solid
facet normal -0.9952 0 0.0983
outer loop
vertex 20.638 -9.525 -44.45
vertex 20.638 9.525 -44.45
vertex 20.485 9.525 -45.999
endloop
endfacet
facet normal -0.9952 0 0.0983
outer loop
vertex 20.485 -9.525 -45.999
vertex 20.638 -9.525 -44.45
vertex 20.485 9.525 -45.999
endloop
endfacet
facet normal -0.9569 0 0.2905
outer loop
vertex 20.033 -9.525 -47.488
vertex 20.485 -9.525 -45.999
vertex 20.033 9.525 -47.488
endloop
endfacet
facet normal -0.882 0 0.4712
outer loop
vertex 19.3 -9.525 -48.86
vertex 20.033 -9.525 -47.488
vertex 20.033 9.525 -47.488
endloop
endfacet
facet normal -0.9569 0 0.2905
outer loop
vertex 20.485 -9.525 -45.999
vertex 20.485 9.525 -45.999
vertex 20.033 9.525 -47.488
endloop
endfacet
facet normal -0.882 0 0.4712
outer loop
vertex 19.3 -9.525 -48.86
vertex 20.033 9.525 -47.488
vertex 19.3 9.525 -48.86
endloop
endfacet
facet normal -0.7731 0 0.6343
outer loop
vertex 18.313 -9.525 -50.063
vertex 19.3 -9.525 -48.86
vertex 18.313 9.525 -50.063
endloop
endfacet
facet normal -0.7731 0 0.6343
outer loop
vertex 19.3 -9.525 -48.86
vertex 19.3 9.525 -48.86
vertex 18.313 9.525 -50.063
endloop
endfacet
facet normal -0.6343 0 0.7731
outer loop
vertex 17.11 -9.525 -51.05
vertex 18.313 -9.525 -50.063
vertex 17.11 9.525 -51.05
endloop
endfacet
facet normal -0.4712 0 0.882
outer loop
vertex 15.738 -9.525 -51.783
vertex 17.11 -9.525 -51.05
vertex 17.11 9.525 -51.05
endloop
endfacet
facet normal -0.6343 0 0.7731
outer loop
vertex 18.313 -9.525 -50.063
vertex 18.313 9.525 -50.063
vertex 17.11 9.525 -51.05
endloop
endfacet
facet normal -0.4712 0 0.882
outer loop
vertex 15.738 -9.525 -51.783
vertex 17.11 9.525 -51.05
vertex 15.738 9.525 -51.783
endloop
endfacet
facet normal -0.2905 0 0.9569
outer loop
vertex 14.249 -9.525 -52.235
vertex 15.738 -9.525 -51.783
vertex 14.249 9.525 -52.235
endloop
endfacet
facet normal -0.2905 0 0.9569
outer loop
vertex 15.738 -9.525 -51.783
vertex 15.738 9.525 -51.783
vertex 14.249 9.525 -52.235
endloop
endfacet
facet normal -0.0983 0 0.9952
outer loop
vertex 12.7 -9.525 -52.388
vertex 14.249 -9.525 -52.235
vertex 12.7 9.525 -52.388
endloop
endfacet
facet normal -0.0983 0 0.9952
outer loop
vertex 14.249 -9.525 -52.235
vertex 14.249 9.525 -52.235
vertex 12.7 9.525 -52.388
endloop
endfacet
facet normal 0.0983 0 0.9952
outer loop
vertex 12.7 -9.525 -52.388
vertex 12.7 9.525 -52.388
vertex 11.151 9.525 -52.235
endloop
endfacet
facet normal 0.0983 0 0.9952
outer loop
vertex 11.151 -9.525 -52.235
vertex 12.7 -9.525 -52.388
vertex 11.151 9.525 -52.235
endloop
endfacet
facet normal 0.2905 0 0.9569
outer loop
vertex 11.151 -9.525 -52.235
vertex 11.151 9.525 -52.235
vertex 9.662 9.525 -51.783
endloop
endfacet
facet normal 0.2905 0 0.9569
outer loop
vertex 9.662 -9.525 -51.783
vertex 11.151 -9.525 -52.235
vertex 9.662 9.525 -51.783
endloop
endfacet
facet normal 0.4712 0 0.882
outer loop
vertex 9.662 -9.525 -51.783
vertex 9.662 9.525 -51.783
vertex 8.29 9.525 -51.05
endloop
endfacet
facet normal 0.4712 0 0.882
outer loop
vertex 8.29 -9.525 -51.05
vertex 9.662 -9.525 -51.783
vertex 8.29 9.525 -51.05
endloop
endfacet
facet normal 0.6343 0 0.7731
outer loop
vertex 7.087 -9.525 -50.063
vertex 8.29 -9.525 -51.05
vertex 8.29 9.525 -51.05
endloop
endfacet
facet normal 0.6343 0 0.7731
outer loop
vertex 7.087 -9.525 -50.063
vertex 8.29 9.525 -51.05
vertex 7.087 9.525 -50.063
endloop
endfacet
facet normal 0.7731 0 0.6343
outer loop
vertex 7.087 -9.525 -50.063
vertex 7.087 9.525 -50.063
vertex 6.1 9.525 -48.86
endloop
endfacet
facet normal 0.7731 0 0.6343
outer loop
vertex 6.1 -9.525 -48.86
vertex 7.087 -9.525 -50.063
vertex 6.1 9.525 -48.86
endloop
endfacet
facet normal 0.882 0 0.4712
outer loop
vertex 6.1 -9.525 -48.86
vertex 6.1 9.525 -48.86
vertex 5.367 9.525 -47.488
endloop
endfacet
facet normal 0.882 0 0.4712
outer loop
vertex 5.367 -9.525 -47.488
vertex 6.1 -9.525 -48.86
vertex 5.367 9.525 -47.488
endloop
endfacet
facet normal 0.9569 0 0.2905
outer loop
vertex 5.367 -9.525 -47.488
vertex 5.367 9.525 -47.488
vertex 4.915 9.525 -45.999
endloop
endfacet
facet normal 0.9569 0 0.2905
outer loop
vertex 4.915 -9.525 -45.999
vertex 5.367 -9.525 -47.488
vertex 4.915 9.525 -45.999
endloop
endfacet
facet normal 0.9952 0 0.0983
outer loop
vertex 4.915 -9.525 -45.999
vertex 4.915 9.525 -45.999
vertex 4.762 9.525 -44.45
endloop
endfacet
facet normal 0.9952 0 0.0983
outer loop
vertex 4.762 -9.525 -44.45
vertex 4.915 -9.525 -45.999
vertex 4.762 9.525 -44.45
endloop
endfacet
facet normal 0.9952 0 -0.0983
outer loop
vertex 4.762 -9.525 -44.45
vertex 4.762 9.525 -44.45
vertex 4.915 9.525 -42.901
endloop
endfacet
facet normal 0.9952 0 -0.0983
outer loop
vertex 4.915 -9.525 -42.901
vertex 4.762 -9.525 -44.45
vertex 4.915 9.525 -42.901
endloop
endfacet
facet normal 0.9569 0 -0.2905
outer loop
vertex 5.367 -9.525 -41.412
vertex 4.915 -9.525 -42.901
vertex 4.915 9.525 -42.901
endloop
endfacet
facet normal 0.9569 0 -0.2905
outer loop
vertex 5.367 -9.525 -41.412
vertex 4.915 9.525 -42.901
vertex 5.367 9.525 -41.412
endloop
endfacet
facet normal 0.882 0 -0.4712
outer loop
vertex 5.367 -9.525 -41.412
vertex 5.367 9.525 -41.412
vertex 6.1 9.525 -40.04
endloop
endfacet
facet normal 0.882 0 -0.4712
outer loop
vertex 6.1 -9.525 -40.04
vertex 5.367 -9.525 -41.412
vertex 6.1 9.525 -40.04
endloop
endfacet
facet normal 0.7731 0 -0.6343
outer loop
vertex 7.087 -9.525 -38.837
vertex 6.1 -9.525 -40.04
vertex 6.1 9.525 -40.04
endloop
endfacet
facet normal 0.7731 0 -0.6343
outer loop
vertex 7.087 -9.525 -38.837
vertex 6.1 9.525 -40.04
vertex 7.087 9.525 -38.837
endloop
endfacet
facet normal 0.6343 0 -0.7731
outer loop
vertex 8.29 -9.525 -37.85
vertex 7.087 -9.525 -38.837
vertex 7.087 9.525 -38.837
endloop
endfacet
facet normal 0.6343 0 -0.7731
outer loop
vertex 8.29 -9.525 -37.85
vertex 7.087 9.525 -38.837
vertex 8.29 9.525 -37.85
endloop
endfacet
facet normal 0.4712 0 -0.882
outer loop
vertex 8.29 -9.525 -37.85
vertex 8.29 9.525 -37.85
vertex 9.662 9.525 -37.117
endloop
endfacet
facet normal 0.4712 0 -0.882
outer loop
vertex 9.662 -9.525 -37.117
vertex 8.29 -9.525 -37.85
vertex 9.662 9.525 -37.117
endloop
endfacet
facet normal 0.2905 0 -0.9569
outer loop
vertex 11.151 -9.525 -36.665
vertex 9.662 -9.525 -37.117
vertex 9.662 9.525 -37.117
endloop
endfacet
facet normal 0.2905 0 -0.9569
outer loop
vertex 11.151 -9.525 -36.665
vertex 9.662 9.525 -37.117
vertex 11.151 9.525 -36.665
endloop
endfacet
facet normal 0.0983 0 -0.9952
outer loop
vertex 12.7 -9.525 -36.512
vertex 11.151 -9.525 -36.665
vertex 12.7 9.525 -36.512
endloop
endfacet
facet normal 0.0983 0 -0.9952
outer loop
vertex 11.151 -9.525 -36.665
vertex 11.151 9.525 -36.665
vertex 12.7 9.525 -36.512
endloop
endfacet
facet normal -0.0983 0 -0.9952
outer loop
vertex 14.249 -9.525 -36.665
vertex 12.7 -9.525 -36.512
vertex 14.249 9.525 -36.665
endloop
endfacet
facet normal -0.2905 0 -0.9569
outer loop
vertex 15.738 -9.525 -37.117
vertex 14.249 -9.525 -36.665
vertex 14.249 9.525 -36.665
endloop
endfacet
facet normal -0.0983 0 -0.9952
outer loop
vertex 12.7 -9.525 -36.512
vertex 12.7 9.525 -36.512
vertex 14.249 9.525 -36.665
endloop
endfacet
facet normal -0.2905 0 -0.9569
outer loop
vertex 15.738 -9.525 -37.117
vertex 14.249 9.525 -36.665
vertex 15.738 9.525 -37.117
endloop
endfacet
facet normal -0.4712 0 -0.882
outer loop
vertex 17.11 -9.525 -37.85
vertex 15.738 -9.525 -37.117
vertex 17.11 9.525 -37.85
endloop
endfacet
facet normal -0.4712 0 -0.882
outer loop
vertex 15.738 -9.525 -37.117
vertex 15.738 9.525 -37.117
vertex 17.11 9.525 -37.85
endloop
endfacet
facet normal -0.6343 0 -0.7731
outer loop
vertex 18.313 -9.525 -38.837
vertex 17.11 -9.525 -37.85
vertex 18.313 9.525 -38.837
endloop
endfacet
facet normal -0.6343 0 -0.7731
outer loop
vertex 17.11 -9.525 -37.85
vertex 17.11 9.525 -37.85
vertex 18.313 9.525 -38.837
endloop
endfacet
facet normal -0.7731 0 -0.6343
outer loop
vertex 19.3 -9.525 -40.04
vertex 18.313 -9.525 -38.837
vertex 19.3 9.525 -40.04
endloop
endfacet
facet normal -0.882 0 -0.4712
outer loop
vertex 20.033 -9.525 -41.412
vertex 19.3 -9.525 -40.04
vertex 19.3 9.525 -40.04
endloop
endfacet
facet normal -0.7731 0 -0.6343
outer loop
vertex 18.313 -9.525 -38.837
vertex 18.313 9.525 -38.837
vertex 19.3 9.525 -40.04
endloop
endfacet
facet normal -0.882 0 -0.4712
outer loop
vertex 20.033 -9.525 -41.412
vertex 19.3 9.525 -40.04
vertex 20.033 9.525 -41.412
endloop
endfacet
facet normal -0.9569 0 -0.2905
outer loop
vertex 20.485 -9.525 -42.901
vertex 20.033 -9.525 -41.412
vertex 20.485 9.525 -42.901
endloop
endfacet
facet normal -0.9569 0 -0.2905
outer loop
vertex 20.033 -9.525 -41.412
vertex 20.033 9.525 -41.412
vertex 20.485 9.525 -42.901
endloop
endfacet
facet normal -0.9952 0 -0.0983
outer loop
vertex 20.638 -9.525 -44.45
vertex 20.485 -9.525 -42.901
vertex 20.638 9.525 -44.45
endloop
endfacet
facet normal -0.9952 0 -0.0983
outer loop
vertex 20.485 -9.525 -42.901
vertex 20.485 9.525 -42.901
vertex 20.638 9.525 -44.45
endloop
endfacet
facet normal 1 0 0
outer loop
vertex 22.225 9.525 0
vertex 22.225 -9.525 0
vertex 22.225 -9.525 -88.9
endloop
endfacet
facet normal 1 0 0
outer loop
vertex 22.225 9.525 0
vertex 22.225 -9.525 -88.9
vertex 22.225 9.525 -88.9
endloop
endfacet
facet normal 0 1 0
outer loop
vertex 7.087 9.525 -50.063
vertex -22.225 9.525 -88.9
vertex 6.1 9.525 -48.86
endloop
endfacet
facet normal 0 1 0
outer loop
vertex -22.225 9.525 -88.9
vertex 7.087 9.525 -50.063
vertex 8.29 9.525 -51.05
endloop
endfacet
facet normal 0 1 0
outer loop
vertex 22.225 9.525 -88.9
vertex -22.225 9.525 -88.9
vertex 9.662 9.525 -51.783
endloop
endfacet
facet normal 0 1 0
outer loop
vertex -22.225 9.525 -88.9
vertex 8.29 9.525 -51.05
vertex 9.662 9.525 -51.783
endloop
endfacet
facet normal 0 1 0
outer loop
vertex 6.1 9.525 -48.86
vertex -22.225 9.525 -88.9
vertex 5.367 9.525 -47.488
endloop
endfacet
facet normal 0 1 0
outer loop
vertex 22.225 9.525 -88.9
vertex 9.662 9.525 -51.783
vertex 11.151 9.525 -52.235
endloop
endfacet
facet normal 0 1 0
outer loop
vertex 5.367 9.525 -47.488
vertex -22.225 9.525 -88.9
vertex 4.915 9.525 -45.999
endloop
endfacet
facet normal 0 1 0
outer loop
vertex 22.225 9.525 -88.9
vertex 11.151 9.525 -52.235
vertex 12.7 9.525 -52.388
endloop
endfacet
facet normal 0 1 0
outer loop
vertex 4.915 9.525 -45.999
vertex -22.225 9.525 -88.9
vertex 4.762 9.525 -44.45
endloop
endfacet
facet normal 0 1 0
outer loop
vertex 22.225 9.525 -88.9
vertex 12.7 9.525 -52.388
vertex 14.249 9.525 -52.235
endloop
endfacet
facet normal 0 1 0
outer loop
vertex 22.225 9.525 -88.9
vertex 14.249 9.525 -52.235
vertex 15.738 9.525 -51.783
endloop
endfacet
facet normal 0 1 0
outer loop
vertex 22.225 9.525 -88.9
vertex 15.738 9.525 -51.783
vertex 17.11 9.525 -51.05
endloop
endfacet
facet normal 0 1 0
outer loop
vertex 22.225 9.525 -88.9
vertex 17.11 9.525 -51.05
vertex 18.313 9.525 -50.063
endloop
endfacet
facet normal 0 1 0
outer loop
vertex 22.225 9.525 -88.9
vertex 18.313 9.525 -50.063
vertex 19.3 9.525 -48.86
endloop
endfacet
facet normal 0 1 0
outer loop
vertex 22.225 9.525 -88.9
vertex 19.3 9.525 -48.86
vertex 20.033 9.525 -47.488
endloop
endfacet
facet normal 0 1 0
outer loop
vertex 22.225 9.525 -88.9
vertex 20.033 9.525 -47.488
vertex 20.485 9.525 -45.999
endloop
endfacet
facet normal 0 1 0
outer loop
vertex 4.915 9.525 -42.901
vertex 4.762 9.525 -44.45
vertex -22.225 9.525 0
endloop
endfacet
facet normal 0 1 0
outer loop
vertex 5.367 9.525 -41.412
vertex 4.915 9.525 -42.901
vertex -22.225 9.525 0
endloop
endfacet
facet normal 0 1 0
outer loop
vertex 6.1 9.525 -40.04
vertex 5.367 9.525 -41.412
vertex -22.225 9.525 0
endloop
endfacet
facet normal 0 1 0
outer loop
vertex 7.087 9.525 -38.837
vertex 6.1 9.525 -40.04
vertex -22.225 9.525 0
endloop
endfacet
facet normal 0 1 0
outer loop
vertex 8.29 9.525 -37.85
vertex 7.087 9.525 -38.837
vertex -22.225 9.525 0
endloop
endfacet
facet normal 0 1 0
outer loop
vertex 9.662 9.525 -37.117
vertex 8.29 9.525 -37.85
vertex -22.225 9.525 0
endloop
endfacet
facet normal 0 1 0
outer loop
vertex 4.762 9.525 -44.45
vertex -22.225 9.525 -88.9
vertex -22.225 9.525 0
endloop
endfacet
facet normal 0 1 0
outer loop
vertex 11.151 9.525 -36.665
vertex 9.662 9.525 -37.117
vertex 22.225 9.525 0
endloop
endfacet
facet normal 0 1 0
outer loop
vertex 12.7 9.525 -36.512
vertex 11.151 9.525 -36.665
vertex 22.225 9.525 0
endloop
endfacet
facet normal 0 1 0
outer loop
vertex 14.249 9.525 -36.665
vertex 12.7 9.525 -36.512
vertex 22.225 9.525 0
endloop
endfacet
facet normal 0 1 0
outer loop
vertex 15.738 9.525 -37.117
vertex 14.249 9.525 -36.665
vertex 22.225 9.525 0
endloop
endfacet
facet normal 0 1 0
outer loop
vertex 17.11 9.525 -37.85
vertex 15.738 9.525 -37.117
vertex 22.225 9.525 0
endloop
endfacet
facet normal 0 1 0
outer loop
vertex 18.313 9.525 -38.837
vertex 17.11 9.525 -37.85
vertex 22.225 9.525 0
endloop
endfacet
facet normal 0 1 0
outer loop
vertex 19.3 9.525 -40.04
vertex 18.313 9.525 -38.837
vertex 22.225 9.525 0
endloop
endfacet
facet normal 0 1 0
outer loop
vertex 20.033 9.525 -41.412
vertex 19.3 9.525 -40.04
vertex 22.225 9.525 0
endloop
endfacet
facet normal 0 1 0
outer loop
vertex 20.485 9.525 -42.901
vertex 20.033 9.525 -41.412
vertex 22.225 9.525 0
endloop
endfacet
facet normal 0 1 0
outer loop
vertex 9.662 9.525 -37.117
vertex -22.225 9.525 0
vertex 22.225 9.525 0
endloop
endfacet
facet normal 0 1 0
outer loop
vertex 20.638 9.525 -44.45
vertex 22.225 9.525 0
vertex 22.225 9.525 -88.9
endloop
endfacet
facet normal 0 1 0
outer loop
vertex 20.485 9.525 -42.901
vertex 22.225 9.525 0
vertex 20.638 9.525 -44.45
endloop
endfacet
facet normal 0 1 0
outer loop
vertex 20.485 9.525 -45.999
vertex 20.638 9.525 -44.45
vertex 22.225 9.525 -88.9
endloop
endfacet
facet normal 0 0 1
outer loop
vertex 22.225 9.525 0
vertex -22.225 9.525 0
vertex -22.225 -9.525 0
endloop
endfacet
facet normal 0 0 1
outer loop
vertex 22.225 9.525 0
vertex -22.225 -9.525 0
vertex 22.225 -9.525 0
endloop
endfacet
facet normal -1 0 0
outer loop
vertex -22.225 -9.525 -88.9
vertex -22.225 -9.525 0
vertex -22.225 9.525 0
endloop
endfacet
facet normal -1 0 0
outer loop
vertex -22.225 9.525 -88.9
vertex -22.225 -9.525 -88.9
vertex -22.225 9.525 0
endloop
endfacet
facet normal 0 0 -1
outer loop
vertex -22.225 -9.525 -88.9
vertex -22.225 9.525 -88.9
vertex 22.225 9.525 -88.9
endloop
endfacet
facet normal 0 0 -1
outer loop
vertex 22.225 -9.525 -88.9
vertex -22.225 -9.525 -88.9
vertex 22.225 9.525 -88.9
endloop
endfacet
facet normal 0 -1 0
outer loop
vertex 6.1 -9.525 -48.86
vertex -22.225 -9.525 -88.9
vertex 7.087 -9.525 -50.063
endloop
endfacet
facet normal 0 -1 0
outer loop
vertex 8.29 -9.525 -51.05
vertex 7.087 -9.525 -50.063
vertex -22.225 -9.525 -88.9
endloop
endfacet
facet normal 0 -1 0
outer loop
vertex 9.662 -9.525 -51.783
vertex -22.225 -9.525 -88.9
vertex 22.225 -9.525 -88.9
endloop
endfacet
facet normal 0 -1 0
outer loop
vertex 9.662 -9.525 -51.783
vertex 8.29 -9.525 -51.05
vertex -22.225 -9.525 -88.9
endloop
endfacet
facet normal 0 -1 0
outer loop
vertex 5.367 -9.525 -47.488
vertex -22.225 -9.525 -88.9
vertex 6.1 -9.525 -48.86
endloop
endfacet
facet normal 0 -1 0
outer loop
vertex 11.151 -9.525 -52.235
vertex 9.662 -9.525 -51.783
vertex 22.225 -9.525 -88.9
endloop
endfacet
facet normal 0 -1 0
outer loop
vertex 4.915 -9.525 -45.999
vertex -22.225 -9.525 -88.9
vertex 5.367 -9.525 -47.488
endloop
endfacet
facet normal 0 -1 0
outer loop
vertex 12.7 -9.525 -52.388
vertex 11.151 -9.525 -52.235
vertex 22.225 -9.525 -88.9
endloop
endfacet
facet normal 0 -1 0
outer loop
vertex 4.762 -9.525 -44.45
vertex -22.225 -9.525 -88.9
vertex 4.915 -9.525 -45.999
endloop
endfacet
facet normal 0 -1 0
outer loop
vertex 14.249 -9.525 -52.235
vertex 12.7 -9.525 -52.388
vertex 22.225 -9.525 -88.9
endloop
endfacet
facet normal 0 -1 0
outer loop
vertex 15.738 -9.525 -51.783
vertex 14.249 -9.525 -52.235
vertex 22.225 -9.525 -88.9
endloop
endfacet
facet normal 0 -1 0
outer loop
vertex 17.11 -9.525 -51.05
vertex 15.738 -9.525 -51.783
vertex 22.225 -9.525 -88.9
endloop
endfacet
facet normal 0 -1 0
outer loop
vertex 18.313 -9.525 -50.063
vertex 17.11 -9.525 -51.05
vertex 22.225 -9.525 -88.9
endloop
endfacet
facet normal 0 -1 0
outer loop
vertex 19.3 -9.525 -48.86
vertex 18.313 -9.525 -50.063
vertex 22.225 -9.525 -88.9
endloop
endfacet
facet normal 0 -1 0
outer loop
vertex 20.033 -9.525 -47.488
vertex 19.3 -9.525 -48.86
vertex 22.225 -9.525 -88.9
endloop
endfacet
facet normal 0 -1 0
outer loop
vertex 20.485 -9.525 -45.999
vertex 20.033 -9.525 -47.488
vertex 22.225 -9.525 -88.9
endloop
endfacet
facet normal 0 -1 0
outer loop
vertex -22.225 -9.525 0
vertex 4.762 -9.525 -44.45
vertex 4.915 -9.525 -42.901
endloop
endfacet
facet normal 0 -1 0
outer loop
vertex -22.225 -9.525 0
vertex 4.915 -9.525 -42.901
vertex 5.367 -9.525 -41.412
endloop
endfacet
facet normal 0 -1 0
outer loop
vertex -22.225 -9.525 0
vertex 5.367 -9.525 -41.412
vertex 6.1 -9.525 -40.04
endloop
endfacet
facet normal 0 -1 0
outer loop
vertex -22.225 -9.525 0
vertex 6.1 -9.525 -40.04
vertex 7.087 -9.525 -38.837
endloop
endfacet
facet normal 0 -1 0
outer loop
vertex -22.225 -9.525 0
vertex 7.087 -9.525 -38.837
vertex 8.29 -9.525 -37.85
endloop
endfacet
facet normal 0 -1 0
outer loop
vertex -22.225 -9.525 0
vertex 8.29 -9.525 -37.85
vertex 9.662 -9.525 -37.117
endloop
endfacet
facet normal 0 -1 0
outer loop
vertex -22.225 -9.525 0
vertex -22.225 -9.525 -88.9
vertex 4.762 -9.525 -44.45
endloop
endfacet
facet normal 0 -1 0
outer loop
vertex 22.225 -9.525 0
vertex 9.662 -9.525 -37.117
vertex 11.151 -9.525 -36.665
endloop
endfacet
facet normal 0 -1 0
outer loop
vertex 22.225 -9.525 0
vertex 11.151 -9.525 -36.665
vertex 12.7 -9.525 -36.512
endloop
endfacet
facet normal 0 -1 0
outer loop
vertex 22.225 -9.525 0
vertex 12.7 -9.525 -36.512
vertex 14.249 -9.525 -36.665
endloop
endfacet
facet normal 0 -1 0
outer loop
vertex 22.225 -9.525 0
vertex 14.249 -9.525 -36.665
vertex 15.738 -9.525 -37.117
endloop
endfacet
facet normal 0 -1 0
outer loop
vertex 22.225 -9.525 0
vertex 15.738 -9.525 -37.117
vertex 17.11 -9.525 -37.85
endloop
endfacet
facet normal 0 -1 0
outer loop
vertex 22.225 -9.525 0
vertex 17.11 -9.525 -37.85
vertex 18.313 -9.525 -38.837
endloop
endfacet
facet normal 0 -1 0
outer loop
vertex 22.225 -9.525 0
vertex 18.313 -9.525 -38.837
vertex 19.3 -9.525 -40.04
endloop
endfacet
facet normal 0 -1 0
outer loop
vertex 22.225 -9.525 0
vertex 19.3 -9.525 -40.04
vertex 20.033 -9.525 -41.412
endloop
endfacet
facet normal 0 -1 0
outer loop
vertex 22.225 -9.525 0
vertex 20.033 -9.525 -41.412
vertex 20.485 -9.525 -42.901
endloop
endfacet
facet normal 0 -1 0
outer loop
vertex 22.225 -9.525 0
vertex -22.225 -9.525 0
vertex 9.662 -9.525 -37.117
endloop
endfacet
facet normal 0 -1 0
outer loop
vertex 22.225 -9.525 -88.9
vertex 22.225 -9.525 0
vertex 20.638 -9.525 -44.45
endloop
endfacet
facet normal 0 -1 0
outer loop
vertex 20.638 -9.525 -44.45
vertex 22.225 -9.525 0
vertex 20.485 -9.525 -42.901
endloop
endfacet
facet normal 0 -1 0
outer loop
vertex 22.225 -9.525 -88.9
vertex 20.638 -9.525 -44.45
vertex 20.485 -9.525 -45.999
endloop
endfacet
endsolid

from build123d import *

# Parameters (mm, degrees)
SKETCH1_W           = 44.45
SKETCH1_H           = 19.05
BOSS_EXTRUDE1_DEPTH = 88.9
SKETCH3_R           = 7.9375
CUT_EXTRUDE1_DEPTH  = 20.05


with BuildPart() as part:
    # Sketch1 → Boss-Extrude1 (new body)
    with BuildSketch(Plane.XY):
        Rectangle(SKETCH1_W, SKETCH1_H)
    extrude(amount=-BOSS_EXTRUDE1_DEPTH)

    # Sketch3 → Cut-Extrude1 (cut, through all)
    with BuildSketch(Plane(origin=(0, 9.525, 0), x_dir=(1, 0, 0), z_dir=(0, 1, 0))):
        with Locations((12.7, 44.45)):
            Circle(SKETCH3_R)
    extrude(amount=-CUT_EXTRUDE1_DEPTH, mode=Mode.SUBTRACT)


solid = part.part
